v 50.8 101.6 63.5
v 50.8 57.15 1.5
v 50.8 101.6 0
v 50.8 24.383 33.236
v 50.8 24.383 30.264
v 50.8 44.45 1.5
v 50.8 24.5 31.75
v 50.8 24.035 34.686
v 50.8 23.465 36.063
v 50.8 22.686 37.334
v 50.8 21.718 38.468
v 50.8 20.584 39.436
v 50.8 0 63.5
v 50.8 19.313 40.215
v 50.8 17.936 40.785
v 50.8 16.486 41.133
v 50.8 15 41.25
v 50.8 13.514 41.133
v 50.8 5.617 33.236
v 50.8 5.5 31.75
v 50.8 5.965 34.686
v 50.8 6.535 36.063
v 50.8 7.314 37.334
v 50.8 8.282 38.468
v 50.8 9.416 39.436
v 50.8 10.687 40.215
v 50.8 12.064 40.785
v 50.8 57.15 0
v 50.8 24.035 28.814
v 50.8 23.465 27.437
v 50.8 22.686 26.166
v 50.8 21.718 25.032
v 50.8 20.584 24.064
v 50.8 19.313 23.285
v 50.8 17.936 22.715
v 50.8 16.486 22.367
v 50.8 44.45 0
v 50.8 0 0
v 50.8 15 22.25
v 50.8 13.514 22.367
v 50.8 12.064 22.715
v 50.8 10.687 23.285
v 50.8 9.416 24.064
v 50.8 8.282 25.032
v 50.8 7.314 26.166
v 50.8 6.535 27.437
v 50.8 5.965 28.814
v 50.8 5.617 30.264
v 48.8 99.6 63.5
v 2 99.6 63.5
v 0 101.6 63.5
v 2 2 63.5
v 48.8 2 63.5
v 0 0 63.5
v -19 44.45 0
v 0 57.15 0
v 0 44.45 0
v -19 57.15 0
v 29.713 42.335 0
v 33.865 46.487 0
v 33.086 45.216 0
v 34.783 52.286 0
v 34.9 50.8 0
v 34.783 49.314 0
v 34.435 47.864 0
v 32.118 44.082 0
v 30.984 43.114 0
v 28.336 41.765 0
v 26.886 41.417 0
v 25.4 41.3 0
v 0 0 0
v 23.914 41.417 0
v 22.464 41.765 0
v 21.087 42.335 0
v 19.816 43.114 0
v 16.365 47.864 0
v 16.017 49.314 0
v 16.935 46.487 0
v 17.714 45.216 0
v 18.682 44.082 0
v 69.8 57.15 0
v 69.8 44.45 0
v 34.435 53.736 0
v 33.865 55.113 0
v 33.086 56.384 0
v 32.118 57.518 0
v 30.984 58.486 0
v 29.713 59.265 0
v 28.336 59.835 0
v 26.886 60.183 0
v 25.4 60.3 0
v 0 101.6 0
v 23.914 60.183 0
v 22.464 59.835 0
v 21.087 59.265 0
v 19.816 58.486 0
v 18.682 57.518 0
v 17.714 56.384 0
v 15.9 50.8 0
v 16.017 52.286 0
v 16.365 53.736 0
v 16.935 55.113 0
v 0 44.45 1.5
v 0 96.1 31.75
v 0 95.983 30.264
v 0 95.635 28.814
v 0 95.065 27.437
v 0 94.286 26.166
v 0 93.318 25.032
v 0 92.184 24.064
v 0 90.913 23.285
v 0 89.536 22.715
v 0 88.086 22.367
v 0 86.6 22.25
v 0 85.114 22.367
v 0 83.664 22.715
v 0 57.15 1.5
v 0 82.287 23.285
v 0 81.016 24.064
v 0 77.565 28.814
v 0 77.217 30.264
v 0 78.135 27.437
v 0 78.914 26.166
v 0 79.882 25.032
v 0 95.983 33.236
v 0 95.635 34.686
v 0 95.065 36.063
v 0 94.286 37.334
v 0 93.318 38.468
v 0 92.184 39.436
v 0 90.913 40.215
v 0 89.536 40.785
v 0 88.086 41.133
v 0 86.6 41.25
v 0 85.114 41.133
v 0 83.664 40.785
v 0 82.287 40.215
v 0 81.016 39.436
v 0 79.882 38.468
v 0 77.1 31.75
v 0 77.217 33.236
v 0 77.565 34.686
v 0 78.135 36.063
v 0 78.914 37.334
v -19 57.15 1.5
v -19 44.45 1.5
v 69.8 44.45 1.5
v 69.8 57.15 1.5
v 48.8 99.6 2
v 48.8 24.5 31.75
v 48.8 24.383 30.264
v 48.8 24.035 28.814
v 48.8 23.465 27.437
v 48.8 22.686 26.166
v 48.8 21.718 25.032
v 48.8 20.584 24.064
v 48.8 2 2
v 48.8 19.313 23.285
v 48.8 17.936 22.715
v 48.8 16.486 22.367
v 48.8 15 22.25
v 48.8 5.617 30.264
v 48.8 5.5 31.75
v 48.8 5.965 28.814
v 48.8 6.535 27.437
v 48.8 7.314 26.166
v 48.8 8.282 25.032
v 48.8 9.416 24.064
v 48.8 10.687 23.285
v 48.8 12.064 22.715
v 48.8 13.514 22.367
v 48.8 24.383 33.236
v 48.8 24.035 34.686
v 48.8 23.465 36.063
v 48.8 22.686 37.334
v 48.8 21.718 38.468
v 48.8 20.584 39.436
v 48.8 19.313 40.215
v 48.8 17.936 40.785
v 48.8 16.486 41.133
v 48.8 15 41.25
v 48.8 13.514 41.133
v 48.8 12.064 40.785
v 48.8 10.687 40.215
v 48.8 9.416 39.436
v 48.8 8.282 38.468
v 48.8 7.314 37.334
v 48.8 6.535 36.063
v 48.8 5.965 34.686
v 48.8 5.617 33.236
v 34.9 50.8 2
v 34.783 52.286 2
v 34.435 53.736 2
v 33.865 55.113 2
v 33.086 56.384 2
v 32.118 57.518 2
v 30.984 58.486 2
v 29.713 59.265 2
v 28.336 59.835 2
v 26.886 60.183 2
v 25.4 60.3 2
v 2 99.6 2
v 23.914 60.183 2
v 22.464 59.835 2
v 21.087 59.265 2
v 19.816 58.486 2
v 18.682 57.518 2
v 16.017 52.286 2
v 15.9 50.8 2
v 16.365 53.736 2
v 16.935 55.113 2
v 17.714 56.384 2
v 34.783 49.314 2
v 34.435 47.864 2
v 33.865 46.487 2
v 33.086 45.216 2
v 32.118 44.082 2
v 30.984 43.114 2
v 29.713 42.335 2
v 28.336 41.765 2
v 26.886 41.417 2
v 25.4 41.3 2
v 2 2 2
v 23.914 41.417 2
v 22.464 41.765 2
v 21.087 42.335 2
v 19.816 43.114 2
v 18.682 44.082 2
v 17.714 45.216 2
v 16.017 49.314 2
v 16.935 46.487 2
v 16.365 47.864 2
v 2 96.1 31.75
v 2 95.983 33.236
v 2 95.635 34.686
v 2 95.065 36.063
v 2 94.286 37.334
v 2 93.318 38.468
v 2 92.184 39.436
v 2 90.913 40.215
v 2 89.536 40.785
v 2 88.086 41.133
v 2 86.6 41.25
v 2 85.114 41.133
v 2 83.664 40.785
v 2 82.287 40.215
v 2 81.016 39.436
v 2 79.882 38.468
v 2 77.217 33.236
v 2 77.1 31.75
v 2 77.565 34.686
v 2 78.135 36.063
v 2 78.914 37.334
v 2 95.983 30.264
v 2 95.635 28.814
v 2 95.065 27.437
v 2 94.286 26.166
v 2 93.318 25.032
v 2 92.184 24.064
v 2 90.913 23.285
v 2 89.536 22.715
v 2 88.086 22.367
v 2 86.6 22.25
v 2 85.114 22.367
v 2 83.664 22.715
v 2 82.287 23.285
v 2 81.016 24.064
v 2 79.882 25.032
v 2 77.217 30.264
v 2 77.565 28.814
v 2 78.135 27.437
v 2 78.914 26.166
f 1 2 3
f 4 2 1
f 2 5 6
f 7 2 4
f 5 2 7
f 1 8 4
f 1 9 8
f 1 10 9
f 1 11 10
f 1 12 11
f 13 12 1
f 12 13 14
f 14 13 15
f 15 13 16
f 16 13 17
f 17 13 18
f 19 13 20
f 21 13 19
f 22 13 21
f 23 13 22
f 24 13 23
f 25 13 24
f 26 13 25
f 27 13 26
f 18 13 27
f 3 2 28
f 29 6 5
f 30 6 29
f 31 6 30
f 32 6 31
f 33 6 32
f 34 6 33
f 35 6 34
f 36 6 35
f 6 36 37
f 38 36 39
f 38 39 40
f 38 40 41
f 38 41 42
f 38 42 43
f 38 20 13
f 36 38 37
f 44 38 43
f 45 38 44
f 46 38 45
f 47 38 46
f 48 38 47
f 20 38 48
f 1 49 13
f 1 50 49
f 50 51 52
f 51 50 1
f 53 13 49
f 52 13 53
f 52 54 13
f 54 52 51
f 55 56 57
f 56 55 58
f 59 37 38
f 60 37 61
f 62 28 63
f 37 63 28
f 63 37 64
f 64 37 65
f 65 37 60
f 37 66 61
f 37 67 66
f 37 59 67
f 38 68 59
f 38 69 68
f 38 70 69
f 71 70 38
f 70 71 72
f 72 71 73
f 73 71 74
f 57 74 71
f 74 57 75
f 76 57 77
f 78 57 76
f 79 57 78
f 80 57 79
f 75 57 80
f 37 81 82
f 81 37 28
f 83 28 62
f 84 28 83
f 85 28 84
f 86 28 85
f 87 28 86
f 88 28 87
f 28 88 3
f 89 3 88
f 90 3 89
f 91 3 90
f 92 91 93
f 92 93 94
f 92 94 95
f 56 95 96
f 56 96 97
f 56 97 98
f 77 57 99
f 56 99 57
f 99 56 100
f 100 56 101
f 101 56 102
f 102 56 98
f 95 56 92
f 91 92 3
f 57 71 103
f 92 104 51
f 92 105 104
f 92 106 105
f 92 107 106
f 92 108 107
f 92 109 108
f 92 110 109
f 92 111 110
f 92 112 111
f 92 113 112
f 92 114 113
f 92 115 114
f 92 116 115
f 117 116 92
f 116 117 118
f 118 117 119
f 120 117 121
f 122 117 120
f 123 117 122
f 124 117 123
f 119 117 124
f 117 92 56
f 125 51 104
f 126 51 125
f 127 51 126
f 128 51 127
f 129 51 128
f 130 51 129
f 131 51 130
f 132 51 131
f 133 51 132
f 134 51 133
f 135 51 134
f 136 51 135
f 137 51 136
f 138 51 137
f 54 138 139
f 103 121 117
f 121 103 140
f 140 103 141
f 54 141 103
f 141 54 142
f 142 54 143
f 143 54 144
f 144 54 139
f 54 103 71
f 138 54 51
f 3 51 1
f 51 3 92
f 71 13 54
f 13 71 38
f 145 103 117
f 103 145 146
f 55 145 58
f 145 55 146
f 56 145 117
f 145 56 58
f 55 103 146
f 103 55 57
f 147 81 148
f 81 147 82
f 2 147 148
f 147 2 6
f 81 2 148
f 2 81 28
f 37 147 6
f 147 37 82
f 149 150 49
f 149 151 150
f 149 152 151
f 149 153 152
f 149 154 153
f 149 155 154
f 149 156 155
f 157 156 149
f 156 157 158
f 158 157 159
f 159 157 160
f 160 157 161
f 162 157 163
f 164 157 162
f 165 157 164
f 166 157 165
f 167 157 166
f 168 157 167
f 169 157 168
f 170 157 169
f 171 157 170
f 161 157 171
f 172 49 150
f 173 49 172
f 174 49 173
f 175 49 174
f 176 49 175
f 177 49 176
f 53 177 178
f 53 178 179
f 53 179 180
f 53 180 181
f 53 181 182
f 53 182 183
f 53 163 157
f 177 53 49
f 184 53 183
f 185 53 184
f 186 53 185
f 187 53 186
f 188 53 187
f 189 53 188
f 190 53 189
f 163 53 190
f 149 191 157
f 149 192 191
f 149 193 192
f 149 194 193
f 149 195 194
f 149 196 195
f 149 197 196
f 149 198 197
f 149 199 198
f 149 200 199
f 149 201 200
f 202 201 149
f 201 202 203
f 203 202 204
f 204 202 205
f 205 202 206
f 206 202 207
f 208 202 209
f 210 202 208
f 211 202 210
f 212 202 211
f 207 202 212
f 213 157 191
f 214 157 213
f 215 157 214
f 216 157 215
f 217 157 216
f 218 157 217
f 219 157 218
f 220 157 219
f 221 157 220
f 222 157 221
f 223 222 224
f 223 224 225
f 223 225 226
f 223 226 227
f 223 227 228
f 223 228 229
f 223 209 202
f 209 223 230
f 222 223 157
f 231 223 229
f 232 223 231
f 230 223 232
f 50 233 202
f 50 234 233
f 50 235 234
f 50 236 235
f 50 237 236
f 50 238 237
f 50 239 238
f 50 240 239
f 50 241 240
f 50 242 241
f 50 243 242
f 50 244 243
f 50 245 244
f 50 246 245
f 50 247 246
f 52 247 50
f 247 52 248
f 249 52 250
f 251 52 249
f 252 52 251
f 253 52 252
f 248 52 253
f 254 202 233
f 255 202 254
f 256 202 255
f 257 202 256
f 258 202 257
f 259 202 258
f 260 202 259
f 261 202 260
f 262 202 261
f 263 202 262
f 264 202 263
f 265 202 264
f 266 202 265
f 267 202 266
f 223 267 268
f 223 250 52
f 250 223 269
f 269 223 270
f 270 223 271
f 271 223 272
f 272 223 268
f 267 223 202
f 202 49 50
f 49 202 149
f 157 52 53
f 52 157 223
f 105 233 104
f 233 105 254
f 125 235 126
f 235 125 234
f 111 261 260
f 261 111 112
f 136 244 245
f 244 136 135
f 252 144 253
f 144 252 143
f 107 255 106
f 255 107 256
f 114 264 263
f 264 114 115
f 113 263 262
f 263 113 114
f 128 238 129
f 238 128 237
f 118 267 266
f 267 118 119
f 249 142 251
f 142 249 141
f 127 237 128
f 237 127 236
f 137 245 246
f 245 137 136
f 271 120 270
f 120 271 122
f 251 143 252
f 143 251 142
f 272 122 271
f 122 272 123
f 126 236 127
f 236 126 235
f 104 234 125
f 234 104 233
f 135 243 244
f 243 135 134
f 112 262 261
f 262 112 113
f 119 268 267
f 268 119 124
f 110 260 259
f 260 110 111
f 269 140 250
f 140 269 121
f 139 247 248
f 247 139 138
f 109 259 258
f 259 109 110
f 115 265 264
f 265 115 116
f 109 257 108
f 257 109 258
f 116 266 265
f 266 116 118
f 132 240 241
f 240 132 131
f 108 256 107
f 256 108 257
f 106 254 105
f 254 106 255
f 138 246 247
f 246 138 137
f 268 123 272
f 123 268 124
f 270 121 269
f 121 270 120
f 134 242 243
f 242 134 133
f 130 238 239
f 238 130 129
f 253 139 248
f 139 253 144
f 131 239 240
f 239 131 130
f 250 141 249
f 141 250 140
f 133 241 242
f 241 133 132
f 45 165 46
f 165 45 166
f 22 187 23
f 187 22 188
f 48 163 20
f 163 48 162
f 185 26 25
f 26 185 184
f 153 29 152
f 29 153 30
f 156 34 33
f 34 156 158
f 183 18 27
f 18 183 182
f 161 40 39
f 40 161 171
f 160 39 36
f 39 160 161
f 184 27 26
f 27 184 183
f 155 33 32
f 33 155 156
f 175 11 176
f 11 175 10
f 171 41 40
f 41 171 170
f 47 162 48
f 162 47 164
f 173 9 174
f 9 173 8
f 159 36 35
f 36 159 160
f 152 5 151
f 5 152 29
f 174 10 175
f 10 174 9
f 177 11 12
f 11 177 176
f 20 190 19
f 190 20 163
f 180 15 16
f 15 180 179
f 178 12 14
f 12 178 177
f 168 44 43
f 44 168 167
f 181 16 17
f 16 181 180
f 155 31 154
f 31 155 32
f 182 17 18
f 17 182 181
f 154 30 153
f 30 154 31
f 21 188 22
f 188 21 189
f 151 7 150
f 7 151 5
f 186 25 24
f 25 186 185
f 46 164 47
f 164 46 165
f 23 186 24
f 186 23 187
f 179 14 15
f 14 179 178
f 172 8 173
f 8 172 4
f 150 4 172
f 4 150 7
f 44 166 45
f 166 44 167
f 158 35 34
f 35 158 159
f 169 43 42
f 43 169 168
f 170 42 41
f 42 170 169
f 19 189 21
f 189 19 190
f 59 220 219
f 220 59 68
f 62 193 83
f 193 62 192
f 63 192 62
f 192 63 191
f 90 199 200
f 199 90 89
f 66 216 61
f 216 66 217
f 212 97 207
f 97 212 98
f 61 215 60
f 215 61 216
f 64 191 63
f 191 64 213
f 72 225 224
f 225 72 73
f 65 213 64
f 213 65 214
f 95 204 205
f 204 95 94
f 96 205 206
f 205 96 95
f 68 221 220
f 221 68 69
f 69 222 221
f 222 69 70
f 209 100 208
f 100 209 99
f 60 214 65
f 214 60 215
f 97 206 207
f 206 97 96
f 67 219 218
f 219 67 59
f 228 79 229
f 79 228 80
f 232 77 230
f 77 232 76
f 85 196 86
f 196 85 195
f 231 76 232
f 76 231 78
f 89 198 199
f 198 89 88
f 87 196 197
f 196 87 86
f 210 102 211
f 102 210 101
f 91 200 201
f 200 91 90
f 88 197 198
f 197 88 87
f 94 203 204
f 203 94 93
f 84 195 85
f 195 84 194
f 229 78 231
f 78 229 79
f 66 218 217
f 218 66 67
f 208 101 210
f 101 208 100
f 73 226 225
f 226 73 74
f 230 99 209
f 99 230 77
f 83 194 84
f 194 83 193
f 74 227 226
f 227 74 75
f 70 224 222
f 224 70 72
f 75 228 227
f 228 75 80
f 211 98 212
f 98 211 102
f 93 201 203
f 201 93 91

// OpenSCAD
// Single Gang Electrical Box (New Work Style)
// Standard dimensions for US single-gang box

// Main dimensions (in mm)
box_width = 50.8;        // 2 inches
box_height = 101.6;      // 4 inches
box_depth = 63.5;        // 2.5 inches (standard depth)
wall_thickness = 2;      // Wall thickness

// Mounting tabs
tab_width = 12.7;        // 0.5 inches
tab_thickness = 1.5;
tab_extension = 19;      // Extension beyond box

// Mounting holes
mounting_hole_diameter = 4.5;  // For #6-32 screws
mounting_hole_spacing = 83.3;  // Standard 3.281 inches center-to-center

// Knockout holes (cable entry)
knockout_diameter = 19;
knockout_offset = 15;

module single_gang_box() {
    difference() {
        union() {
            // Main box body
            cube([box_width, box_height, box_depth]);

            // Top mounting tab
            translate([-tab_extension, (box_height - tab_width)/2, 0])
                cube([tab_extension, tab_width, tab_thickness]);

            // Bottom mounting tab
            translate([box_width, (box_height - tab_width)/2, 0])
                cube([tab_extension, tab_width, tab_thickness]);
        }

        // Hollow out the interior
        translate([wall_thickness, wall_thickness, wall_thickness])
            cube([box_width - 2*wall_thickness,
                  box_height - 2*wall_thickness,
                  box_depth]);

        // Top mounting hole
        translate([-tab_extension/2, box_height/2 - mounting_hole_spacing/2, -1])
            cylinder(d=mounting_hole_diameter, h=tab_thickness + 2, $fn=30);

        // Bottom mounting hole
        translate([box_width + tab_extension/2, box_height/2 + mounting_hole_spacing/2, -1])
            cylinder(d=mounting_hole_diameter, h=tab_thickness + 2, $fn=30);

        // Cable knockout holes on sides
        // Left side
        translate([-1, box_height - knockout_offset, box_depth/2])
            rotate([0, 90, 0])
            cylinder(d=knockout_diameter, h=wall_thickness + 2, $fn=40);

        // Right side
        translate([box_width - wall_thickness - 1, knockout_offset, box_depth/2])
            rotate([0, 90, 0])
            cylinder(d=knockout_diameter, h=wall_thickness + 2, $fn=40);

        // Back knockout
        translate([box_width/2, box_height/2, -1])
            cylinder(d=knockout_diameter, h=wall_thickness + 2, $fn=40);
    }
}

// Render the box
single_gang_box();
